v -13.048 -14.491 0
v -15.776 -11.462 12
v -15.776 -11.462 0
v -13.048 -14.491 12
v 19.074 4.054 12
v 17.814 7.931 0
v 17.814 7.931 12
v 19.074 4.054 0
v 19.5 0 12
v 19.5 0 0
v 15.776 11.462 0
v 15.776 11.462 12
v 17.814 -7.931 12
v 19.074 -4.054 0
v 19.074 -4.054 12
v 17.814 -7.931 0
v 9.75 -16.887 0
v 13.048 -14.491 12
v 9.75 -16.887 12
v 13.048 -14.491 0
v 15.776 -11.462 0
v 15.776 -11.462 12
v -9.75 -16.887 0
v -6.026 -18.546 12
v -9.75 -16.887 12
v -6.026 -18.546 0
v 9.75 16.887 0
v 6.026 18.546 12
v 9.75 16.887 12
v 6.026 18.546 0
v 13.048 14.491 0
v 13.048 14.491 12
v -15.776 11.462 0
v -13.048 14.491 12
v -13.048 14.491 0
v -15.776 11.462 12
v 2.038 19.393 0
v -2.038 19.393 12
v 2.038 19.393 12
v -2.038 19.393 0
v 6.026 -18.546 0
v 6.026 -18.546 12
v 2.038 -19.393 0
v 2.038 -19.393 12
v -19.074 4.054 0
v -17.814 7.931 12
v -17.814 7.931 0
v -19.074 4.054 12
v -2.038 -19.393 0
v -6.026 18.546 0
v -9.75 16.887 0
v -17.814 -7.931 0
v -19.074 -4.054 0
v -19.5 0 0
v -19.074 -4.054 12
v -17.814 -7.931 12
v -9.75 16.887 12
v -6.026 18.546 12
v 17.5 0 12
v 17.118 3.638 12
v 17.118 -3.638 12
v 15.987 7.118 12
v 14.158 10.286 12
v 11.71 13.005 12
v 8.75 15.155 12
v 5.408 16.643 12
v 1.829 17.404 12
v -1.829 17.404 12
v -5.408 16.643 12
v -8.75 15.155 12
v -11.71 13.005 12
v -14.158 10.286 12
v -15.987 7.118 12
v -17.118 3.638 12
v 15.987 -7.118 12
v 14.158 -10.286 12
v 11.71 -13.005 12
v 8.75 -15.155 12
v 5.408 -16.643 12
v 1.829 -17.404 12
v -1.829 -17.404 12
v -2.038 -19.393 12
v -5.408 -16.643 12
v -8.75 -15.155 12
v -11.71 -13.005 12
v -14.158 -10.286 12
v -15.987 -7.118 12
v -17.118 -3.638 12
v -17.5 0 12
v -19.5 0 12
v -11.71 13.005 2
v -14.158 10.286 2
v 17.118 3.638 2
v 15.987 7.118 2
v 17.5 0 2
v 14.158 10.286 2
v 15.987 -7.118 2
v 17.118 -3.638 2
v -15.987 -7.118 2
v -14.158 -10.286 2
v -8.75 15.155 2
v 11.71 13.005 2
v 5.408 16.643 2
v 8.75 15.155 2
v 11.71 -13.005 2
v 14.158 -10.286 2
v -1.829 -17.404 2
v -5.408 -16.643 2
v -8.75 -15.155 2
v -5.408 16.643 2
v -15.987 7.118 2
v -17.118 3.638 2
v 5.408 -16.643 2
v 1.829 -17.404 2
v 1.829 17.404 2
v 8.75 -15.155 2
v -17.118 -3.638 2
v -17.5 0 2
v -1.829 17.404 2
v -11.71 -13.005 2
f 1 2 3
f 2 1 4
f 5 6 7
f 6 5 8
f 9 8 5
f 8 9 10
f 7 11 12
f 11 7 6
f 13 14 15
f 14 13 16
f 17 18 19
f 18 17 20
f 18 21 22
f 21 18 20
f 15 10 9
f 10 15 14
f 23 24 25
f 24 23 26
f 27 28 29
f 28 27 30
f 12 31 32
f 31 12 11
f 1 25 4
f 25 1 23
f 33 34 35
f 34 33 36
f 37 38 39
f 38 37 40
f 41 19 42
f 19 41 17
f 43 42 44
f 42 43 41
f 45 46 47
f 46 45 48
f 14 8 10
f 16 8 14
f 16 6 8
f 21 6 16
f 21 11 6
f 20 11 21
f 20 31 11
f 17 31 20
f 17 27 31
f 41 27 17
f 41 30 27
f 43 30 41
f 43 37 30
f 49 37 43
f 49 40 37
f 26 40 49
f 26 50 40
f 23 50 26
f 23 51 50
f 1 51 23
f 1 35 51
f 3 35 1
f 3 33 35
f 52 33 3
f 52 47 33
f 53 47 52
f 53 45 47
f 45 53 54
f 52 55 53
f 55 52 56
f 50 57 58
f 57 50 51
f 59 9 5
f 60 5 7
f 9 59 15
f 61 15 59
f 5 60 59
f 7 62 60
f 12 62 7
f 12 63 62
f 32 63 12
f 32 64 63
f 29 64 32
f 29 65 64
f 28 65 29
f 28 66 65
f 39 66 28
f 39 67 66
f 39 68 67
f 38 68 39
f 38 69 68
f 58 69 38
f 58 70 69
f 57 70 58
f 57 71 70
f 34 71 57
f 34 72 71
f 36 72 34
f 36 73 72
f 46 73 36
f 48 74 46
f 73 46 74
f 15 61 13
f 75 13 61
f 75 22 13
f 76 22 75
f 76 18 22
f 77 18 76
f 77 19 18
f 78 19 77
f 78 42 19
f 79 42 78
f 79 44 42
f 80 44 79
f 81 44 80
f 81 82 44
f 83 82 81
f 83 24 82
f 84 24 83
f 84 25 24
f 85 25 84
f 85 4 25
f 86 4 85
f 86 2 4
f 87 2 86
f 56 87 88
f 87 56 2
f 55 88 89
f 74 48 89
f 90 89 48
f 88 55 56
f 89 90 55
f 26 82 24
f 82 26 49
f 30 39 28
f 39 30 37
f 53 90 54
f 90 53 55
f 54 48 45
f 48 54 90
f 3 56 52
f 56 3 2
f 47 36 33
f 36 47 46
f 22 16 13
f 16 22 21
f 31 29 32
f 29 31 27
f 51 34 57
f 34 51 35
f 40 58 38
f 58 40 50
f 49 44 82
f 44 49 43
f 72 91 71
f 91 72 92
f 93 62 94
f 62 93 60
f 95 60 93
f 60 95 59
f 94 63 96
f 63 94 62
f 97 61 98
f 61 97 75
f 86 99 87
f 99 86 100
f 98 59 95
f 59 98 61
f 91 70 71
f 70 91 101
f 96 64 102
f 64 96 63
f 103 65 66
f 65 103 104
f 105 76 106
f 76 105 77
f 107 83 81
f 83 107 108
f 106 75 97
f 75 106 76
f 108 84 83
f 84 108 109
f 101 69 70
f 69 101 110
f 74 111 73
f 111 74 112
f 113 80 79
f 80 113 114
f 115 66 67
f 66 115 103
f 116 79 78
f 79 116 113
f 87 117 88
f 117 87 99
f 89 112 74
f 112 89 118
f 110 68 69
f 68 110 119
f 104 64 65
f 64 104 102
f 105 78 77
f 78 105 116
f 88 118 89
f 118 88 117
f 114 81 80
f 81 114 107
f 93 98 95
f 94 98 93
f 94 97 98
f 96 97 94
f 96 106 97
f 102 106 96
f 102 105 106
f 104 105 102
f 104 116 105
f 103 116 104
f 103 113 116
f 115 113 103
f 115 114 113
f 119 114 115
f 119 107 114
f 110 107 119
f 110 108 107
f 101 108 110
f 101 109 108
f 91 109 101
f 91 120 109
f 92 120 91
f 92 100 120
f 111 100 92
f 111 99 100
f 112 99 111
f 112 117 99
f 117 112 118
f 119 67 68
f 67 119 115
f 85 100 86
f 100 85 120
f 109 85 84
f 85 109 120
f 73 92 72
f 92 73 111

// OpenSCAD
//The inner radius of the octavator.
innerRadius = 17.5; //Can be any positive number (default: 17.5)
//The inner height of the octavator.
innerHeight = 10; //Can be any positive number (default: 10)
//The wall thickness of the octavator.
wallThickness = 2; //Can be any positive number (default: 2)

difference () {
    cylinder(r=innerRadius+wallThickness, h=innerHeight+2);
        translate([0,0,2])cylinder(r=innerRadius, h=innerHeight+2);
}
